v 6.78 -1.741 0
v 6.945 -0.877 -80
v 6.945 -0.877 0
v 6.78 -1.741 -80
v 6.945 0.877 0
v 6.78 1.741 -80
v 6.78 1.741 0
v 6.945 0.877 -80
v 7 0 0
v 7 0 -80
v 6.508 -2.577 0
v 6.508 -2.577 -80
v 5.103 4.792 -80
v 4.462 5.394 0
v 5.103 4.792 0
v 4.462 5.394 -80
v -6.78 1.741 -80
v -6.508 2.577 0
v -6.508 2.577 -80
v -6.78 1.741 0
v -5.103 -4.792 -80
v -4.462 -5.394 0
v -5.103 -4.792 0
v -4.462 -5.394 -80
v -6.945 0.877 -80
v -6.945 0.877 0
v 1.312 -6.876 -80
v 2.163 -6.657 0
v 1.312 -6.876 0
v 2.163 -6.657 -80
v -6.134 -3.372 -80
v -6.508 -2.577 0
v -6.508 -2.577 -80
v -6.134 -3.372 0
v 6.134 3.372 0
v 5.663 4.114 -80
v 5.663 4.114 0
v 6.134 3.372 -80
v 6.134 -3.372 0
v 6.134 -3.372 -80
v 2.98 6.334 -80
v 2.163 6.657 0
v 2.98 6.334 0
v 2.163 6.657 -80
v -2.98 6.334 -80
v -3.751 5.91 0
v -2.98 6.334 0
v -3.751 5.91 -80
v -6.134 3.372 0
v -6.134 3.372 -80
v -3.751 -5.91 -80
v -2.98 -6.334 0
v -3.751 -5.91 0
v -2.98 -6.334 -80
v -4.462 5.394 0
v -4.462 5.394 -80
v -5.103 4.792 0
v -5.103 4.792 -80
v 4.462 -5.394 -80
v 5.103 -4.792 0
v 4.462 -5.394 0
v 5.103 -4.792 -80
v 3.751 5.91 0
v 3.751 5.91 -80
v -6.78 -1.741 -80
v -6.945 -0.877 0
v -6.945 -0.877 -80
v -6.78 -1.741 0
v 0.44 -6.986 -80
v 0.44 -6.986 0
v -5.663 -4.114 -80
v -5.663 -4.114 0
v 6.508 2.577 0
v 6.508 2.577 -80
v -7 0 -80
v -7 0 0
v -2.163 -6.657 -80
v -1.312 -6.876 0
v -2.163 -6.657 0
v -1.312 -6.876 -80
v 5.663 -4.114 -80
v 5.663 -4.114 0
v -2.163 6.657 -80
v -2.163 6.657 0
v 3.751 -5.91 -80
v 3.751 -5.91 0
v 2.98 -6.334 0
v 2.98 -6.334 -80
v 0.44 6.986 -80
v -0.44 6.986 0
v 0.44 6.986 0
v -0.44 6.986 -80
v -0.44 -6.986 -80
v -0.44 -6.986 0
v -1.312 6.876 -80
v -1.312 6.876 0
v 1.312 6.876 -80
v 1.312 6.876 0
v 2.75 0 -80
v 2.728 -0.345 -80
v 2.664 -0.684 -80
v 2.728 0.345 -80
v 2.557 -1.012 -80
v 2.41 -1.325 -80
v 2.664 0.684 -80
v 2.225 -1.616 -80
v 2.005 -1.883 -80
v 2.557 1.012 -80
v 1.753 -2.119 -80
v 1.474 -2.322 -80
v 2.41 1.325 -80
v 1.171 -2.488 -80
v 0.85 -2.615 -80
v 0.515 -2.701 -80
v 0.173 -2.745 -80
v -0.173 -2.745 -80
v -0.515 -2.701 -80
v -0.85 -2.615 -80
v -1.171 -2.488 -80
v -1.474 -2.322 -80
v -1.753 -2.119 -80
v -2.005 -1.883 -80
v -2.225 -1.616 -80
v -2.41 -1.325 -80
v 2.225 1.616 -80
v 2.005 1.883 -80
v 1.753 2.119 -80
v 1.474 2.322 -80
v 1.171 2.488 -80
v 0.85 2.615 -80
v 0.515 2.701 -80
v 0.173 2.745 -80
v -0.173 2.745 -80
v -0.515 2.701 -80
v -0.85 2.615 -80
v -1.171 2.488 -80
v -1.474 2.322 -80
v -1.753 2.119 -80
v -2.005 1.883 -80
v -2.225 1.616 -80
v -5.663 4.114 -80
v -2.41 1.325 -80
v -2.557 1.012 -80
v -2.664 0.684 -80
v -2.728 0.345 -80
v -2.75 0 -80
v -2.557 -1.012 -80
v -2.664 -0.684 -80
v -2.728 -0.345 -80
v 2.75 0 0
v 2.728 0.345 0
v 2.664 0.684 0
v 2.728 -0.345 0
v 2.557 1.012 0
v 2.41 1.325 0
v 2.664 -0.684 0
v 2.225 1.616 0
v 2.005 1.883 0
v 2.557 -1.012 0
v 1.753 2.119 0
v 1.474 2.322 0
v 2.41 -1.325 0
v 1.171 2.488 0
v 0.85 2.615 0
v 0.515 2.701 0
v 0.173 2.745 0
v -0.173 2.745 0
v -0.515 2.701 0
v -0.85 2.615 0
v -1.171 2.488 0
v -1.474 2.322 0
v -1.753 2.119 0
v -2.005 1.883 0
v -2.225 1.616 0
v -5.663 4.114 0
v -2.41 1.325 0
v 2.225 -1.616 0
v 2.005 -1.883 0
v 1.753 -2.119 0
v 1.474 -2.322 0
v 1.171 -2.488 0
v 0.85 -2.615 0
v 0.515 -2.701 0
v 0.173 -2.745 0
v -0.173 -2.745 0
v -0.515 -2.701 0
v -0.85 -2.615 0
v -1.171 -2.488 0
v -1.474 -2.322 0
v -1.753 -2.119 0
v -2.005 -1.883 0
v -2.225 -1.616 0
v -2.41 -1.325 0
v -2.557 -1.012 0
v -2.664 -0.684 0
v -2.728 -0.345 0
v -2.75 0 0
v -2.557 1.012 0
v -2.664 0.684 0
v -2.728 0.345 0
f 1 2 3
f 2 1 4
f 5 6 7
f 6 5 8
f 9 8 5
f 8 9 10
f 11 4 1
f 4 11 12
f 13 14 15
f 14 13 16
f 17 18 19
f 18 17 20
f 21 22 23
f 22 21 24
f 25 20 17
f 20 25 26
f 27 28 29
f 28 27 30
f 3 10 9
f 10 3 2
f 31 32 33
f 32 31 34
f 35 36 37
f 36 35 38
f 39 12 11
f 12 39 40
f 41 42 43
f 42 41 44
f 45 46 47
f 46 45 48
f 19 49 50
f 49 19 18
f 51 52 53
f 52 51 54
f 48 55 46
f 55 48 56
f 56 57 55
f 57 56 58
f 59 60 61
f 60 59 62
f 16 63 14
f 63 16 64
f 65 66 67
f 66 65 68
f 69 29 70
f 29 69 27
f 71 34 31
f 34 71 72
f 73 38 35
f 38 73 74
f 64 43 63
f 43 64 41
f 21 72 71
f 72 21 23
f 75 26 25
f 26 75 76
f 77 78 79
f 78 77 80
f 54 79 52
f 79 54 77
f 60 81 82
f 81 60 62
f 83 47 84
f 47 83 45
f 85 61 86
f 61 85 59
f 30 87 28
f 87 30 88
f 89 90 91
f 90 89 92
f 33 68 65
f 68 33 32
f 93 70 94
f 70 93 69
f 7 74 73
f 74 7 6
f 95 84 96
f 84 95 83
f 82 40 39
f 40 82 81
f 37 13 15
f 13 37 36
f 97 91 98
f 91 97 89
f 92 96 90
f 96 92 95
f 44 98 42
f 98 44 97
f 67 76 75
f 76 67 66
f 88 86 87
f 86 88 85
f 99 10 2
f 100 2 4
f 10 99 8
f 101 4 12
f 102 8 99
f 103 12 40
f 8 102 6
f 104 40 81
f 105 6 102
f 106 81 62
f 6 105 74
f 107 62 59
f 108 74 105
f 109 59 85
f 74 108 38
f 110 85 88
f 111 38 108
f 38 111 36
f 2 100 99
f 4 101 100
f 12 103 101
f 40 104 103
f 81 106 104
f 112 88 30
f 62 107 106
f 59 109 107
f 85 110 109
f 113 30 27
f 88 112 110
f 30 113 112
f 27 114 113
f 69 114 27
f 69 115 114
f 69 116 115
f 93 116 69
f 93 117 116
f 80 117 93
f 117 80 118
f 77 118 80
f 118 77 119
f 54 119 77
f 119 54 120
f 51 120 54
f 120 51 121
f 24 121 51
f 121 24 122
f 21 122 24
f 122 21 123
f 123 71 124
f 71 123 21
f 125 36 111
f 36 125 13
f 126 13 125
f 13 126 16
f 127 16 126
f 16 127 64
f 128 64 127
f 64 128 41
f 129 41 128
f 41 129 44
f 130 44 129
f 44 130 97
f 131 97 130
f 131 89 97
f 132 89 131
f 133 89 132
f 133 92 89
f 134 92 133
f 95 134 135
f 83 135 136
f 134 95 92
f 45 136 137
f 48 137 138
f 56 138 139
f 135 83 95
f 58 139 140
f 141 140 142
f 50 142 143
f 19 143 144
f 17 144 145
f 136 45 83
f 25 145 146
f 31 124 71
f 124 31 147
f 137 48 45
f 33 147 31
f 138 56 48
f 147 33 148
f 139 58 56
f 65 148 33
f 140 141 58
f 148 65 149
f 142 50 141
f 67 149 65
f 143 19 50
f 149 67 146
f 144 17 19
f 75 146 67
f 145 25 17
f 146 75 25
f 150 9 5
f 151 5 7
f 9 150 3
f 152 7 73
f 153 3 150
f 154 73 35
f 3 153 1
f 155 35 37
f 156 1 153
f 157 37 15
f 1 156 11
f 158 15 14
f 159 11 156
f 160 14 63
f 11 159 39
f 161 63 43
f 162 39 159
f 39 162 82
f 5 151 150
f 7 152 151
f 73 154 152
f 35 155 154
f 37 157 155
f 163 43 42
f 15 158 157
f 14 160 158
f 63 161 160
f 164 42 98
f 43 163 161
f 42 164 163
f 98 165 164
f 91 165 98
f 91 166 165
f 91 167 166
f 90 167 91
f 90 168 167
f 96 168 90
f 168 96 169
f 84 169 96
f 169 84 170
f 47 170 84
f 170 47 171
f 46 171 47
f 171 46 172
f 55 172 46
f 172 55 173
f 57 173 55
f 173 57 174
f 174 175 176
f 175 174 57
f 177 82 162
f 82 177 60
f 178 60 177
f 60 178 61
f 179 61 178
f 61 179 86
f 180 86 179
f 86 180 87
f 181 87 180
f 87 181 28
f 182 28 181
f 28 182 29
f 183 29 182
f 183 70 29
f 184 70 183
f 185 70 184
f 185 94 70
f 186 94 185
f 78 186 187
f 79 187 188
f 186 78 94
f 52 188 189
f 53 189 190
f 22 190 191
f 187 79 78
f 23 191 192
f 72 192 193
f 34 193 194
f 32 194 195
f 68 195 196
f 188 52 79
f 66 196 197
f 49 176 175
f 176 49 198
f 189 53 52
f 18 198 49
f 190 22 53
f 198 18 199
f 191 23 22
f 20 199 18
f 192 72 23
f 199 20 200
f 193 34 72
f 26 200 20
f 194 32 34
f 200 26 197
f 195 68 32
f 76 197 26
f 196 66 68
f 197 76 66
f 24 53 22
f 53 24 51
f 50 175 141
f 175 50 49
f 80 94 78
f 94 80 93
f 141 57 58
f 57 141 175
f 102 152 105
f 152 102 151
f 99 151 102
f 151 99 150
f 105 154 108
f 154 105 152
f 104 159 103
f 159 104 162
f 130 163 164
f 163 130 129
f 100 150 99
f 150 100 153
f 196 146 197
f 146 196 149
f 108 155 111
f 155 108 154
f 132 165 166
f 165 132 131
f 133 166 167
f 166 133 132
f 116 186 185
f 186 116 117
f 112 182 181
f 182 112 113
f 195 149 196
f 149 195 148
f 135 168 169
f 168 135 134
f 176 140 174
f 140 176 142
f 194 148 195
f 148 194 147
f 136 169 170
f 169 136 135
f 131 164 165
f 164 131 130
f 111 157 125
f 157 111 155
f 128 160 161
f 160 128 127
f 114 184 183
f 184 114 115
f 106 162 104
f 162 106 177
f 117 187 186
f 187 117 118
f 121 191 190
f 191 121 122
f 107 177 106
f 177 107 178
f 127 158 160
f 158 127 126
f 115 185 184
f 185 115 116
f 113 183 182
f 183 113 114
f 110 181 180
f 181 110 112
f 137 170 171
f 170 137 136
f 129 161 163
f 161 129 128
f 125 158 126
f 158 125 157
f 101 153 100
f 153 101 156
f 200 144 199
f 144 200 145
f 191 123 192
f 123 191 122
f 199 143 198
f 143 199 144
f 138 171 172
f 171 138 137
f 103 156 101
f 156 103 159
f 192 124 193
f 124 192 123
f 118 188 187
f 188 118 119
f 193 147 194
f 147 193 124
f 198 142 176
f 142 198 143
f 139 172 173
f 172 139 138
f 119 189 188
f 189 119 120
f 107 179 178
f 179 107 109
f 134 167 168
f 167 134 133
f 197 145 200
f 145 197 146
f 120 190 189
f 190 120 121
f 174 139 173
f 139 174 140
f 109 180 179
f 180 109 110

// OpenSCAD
$fn = 50;


difference() {
	union() {
		translate(v = [0, 0, -80.0000000000]) {
			cylinder(h = 80, r = 7.0000000000);
		}
		cylinder(h = 0, r = 10.0000000000);
	}
	union() {
		#translate(v = [0, 0, -80]) {
			cylinder(h = 80, r = 2.7500000000);
		}
	}
}
